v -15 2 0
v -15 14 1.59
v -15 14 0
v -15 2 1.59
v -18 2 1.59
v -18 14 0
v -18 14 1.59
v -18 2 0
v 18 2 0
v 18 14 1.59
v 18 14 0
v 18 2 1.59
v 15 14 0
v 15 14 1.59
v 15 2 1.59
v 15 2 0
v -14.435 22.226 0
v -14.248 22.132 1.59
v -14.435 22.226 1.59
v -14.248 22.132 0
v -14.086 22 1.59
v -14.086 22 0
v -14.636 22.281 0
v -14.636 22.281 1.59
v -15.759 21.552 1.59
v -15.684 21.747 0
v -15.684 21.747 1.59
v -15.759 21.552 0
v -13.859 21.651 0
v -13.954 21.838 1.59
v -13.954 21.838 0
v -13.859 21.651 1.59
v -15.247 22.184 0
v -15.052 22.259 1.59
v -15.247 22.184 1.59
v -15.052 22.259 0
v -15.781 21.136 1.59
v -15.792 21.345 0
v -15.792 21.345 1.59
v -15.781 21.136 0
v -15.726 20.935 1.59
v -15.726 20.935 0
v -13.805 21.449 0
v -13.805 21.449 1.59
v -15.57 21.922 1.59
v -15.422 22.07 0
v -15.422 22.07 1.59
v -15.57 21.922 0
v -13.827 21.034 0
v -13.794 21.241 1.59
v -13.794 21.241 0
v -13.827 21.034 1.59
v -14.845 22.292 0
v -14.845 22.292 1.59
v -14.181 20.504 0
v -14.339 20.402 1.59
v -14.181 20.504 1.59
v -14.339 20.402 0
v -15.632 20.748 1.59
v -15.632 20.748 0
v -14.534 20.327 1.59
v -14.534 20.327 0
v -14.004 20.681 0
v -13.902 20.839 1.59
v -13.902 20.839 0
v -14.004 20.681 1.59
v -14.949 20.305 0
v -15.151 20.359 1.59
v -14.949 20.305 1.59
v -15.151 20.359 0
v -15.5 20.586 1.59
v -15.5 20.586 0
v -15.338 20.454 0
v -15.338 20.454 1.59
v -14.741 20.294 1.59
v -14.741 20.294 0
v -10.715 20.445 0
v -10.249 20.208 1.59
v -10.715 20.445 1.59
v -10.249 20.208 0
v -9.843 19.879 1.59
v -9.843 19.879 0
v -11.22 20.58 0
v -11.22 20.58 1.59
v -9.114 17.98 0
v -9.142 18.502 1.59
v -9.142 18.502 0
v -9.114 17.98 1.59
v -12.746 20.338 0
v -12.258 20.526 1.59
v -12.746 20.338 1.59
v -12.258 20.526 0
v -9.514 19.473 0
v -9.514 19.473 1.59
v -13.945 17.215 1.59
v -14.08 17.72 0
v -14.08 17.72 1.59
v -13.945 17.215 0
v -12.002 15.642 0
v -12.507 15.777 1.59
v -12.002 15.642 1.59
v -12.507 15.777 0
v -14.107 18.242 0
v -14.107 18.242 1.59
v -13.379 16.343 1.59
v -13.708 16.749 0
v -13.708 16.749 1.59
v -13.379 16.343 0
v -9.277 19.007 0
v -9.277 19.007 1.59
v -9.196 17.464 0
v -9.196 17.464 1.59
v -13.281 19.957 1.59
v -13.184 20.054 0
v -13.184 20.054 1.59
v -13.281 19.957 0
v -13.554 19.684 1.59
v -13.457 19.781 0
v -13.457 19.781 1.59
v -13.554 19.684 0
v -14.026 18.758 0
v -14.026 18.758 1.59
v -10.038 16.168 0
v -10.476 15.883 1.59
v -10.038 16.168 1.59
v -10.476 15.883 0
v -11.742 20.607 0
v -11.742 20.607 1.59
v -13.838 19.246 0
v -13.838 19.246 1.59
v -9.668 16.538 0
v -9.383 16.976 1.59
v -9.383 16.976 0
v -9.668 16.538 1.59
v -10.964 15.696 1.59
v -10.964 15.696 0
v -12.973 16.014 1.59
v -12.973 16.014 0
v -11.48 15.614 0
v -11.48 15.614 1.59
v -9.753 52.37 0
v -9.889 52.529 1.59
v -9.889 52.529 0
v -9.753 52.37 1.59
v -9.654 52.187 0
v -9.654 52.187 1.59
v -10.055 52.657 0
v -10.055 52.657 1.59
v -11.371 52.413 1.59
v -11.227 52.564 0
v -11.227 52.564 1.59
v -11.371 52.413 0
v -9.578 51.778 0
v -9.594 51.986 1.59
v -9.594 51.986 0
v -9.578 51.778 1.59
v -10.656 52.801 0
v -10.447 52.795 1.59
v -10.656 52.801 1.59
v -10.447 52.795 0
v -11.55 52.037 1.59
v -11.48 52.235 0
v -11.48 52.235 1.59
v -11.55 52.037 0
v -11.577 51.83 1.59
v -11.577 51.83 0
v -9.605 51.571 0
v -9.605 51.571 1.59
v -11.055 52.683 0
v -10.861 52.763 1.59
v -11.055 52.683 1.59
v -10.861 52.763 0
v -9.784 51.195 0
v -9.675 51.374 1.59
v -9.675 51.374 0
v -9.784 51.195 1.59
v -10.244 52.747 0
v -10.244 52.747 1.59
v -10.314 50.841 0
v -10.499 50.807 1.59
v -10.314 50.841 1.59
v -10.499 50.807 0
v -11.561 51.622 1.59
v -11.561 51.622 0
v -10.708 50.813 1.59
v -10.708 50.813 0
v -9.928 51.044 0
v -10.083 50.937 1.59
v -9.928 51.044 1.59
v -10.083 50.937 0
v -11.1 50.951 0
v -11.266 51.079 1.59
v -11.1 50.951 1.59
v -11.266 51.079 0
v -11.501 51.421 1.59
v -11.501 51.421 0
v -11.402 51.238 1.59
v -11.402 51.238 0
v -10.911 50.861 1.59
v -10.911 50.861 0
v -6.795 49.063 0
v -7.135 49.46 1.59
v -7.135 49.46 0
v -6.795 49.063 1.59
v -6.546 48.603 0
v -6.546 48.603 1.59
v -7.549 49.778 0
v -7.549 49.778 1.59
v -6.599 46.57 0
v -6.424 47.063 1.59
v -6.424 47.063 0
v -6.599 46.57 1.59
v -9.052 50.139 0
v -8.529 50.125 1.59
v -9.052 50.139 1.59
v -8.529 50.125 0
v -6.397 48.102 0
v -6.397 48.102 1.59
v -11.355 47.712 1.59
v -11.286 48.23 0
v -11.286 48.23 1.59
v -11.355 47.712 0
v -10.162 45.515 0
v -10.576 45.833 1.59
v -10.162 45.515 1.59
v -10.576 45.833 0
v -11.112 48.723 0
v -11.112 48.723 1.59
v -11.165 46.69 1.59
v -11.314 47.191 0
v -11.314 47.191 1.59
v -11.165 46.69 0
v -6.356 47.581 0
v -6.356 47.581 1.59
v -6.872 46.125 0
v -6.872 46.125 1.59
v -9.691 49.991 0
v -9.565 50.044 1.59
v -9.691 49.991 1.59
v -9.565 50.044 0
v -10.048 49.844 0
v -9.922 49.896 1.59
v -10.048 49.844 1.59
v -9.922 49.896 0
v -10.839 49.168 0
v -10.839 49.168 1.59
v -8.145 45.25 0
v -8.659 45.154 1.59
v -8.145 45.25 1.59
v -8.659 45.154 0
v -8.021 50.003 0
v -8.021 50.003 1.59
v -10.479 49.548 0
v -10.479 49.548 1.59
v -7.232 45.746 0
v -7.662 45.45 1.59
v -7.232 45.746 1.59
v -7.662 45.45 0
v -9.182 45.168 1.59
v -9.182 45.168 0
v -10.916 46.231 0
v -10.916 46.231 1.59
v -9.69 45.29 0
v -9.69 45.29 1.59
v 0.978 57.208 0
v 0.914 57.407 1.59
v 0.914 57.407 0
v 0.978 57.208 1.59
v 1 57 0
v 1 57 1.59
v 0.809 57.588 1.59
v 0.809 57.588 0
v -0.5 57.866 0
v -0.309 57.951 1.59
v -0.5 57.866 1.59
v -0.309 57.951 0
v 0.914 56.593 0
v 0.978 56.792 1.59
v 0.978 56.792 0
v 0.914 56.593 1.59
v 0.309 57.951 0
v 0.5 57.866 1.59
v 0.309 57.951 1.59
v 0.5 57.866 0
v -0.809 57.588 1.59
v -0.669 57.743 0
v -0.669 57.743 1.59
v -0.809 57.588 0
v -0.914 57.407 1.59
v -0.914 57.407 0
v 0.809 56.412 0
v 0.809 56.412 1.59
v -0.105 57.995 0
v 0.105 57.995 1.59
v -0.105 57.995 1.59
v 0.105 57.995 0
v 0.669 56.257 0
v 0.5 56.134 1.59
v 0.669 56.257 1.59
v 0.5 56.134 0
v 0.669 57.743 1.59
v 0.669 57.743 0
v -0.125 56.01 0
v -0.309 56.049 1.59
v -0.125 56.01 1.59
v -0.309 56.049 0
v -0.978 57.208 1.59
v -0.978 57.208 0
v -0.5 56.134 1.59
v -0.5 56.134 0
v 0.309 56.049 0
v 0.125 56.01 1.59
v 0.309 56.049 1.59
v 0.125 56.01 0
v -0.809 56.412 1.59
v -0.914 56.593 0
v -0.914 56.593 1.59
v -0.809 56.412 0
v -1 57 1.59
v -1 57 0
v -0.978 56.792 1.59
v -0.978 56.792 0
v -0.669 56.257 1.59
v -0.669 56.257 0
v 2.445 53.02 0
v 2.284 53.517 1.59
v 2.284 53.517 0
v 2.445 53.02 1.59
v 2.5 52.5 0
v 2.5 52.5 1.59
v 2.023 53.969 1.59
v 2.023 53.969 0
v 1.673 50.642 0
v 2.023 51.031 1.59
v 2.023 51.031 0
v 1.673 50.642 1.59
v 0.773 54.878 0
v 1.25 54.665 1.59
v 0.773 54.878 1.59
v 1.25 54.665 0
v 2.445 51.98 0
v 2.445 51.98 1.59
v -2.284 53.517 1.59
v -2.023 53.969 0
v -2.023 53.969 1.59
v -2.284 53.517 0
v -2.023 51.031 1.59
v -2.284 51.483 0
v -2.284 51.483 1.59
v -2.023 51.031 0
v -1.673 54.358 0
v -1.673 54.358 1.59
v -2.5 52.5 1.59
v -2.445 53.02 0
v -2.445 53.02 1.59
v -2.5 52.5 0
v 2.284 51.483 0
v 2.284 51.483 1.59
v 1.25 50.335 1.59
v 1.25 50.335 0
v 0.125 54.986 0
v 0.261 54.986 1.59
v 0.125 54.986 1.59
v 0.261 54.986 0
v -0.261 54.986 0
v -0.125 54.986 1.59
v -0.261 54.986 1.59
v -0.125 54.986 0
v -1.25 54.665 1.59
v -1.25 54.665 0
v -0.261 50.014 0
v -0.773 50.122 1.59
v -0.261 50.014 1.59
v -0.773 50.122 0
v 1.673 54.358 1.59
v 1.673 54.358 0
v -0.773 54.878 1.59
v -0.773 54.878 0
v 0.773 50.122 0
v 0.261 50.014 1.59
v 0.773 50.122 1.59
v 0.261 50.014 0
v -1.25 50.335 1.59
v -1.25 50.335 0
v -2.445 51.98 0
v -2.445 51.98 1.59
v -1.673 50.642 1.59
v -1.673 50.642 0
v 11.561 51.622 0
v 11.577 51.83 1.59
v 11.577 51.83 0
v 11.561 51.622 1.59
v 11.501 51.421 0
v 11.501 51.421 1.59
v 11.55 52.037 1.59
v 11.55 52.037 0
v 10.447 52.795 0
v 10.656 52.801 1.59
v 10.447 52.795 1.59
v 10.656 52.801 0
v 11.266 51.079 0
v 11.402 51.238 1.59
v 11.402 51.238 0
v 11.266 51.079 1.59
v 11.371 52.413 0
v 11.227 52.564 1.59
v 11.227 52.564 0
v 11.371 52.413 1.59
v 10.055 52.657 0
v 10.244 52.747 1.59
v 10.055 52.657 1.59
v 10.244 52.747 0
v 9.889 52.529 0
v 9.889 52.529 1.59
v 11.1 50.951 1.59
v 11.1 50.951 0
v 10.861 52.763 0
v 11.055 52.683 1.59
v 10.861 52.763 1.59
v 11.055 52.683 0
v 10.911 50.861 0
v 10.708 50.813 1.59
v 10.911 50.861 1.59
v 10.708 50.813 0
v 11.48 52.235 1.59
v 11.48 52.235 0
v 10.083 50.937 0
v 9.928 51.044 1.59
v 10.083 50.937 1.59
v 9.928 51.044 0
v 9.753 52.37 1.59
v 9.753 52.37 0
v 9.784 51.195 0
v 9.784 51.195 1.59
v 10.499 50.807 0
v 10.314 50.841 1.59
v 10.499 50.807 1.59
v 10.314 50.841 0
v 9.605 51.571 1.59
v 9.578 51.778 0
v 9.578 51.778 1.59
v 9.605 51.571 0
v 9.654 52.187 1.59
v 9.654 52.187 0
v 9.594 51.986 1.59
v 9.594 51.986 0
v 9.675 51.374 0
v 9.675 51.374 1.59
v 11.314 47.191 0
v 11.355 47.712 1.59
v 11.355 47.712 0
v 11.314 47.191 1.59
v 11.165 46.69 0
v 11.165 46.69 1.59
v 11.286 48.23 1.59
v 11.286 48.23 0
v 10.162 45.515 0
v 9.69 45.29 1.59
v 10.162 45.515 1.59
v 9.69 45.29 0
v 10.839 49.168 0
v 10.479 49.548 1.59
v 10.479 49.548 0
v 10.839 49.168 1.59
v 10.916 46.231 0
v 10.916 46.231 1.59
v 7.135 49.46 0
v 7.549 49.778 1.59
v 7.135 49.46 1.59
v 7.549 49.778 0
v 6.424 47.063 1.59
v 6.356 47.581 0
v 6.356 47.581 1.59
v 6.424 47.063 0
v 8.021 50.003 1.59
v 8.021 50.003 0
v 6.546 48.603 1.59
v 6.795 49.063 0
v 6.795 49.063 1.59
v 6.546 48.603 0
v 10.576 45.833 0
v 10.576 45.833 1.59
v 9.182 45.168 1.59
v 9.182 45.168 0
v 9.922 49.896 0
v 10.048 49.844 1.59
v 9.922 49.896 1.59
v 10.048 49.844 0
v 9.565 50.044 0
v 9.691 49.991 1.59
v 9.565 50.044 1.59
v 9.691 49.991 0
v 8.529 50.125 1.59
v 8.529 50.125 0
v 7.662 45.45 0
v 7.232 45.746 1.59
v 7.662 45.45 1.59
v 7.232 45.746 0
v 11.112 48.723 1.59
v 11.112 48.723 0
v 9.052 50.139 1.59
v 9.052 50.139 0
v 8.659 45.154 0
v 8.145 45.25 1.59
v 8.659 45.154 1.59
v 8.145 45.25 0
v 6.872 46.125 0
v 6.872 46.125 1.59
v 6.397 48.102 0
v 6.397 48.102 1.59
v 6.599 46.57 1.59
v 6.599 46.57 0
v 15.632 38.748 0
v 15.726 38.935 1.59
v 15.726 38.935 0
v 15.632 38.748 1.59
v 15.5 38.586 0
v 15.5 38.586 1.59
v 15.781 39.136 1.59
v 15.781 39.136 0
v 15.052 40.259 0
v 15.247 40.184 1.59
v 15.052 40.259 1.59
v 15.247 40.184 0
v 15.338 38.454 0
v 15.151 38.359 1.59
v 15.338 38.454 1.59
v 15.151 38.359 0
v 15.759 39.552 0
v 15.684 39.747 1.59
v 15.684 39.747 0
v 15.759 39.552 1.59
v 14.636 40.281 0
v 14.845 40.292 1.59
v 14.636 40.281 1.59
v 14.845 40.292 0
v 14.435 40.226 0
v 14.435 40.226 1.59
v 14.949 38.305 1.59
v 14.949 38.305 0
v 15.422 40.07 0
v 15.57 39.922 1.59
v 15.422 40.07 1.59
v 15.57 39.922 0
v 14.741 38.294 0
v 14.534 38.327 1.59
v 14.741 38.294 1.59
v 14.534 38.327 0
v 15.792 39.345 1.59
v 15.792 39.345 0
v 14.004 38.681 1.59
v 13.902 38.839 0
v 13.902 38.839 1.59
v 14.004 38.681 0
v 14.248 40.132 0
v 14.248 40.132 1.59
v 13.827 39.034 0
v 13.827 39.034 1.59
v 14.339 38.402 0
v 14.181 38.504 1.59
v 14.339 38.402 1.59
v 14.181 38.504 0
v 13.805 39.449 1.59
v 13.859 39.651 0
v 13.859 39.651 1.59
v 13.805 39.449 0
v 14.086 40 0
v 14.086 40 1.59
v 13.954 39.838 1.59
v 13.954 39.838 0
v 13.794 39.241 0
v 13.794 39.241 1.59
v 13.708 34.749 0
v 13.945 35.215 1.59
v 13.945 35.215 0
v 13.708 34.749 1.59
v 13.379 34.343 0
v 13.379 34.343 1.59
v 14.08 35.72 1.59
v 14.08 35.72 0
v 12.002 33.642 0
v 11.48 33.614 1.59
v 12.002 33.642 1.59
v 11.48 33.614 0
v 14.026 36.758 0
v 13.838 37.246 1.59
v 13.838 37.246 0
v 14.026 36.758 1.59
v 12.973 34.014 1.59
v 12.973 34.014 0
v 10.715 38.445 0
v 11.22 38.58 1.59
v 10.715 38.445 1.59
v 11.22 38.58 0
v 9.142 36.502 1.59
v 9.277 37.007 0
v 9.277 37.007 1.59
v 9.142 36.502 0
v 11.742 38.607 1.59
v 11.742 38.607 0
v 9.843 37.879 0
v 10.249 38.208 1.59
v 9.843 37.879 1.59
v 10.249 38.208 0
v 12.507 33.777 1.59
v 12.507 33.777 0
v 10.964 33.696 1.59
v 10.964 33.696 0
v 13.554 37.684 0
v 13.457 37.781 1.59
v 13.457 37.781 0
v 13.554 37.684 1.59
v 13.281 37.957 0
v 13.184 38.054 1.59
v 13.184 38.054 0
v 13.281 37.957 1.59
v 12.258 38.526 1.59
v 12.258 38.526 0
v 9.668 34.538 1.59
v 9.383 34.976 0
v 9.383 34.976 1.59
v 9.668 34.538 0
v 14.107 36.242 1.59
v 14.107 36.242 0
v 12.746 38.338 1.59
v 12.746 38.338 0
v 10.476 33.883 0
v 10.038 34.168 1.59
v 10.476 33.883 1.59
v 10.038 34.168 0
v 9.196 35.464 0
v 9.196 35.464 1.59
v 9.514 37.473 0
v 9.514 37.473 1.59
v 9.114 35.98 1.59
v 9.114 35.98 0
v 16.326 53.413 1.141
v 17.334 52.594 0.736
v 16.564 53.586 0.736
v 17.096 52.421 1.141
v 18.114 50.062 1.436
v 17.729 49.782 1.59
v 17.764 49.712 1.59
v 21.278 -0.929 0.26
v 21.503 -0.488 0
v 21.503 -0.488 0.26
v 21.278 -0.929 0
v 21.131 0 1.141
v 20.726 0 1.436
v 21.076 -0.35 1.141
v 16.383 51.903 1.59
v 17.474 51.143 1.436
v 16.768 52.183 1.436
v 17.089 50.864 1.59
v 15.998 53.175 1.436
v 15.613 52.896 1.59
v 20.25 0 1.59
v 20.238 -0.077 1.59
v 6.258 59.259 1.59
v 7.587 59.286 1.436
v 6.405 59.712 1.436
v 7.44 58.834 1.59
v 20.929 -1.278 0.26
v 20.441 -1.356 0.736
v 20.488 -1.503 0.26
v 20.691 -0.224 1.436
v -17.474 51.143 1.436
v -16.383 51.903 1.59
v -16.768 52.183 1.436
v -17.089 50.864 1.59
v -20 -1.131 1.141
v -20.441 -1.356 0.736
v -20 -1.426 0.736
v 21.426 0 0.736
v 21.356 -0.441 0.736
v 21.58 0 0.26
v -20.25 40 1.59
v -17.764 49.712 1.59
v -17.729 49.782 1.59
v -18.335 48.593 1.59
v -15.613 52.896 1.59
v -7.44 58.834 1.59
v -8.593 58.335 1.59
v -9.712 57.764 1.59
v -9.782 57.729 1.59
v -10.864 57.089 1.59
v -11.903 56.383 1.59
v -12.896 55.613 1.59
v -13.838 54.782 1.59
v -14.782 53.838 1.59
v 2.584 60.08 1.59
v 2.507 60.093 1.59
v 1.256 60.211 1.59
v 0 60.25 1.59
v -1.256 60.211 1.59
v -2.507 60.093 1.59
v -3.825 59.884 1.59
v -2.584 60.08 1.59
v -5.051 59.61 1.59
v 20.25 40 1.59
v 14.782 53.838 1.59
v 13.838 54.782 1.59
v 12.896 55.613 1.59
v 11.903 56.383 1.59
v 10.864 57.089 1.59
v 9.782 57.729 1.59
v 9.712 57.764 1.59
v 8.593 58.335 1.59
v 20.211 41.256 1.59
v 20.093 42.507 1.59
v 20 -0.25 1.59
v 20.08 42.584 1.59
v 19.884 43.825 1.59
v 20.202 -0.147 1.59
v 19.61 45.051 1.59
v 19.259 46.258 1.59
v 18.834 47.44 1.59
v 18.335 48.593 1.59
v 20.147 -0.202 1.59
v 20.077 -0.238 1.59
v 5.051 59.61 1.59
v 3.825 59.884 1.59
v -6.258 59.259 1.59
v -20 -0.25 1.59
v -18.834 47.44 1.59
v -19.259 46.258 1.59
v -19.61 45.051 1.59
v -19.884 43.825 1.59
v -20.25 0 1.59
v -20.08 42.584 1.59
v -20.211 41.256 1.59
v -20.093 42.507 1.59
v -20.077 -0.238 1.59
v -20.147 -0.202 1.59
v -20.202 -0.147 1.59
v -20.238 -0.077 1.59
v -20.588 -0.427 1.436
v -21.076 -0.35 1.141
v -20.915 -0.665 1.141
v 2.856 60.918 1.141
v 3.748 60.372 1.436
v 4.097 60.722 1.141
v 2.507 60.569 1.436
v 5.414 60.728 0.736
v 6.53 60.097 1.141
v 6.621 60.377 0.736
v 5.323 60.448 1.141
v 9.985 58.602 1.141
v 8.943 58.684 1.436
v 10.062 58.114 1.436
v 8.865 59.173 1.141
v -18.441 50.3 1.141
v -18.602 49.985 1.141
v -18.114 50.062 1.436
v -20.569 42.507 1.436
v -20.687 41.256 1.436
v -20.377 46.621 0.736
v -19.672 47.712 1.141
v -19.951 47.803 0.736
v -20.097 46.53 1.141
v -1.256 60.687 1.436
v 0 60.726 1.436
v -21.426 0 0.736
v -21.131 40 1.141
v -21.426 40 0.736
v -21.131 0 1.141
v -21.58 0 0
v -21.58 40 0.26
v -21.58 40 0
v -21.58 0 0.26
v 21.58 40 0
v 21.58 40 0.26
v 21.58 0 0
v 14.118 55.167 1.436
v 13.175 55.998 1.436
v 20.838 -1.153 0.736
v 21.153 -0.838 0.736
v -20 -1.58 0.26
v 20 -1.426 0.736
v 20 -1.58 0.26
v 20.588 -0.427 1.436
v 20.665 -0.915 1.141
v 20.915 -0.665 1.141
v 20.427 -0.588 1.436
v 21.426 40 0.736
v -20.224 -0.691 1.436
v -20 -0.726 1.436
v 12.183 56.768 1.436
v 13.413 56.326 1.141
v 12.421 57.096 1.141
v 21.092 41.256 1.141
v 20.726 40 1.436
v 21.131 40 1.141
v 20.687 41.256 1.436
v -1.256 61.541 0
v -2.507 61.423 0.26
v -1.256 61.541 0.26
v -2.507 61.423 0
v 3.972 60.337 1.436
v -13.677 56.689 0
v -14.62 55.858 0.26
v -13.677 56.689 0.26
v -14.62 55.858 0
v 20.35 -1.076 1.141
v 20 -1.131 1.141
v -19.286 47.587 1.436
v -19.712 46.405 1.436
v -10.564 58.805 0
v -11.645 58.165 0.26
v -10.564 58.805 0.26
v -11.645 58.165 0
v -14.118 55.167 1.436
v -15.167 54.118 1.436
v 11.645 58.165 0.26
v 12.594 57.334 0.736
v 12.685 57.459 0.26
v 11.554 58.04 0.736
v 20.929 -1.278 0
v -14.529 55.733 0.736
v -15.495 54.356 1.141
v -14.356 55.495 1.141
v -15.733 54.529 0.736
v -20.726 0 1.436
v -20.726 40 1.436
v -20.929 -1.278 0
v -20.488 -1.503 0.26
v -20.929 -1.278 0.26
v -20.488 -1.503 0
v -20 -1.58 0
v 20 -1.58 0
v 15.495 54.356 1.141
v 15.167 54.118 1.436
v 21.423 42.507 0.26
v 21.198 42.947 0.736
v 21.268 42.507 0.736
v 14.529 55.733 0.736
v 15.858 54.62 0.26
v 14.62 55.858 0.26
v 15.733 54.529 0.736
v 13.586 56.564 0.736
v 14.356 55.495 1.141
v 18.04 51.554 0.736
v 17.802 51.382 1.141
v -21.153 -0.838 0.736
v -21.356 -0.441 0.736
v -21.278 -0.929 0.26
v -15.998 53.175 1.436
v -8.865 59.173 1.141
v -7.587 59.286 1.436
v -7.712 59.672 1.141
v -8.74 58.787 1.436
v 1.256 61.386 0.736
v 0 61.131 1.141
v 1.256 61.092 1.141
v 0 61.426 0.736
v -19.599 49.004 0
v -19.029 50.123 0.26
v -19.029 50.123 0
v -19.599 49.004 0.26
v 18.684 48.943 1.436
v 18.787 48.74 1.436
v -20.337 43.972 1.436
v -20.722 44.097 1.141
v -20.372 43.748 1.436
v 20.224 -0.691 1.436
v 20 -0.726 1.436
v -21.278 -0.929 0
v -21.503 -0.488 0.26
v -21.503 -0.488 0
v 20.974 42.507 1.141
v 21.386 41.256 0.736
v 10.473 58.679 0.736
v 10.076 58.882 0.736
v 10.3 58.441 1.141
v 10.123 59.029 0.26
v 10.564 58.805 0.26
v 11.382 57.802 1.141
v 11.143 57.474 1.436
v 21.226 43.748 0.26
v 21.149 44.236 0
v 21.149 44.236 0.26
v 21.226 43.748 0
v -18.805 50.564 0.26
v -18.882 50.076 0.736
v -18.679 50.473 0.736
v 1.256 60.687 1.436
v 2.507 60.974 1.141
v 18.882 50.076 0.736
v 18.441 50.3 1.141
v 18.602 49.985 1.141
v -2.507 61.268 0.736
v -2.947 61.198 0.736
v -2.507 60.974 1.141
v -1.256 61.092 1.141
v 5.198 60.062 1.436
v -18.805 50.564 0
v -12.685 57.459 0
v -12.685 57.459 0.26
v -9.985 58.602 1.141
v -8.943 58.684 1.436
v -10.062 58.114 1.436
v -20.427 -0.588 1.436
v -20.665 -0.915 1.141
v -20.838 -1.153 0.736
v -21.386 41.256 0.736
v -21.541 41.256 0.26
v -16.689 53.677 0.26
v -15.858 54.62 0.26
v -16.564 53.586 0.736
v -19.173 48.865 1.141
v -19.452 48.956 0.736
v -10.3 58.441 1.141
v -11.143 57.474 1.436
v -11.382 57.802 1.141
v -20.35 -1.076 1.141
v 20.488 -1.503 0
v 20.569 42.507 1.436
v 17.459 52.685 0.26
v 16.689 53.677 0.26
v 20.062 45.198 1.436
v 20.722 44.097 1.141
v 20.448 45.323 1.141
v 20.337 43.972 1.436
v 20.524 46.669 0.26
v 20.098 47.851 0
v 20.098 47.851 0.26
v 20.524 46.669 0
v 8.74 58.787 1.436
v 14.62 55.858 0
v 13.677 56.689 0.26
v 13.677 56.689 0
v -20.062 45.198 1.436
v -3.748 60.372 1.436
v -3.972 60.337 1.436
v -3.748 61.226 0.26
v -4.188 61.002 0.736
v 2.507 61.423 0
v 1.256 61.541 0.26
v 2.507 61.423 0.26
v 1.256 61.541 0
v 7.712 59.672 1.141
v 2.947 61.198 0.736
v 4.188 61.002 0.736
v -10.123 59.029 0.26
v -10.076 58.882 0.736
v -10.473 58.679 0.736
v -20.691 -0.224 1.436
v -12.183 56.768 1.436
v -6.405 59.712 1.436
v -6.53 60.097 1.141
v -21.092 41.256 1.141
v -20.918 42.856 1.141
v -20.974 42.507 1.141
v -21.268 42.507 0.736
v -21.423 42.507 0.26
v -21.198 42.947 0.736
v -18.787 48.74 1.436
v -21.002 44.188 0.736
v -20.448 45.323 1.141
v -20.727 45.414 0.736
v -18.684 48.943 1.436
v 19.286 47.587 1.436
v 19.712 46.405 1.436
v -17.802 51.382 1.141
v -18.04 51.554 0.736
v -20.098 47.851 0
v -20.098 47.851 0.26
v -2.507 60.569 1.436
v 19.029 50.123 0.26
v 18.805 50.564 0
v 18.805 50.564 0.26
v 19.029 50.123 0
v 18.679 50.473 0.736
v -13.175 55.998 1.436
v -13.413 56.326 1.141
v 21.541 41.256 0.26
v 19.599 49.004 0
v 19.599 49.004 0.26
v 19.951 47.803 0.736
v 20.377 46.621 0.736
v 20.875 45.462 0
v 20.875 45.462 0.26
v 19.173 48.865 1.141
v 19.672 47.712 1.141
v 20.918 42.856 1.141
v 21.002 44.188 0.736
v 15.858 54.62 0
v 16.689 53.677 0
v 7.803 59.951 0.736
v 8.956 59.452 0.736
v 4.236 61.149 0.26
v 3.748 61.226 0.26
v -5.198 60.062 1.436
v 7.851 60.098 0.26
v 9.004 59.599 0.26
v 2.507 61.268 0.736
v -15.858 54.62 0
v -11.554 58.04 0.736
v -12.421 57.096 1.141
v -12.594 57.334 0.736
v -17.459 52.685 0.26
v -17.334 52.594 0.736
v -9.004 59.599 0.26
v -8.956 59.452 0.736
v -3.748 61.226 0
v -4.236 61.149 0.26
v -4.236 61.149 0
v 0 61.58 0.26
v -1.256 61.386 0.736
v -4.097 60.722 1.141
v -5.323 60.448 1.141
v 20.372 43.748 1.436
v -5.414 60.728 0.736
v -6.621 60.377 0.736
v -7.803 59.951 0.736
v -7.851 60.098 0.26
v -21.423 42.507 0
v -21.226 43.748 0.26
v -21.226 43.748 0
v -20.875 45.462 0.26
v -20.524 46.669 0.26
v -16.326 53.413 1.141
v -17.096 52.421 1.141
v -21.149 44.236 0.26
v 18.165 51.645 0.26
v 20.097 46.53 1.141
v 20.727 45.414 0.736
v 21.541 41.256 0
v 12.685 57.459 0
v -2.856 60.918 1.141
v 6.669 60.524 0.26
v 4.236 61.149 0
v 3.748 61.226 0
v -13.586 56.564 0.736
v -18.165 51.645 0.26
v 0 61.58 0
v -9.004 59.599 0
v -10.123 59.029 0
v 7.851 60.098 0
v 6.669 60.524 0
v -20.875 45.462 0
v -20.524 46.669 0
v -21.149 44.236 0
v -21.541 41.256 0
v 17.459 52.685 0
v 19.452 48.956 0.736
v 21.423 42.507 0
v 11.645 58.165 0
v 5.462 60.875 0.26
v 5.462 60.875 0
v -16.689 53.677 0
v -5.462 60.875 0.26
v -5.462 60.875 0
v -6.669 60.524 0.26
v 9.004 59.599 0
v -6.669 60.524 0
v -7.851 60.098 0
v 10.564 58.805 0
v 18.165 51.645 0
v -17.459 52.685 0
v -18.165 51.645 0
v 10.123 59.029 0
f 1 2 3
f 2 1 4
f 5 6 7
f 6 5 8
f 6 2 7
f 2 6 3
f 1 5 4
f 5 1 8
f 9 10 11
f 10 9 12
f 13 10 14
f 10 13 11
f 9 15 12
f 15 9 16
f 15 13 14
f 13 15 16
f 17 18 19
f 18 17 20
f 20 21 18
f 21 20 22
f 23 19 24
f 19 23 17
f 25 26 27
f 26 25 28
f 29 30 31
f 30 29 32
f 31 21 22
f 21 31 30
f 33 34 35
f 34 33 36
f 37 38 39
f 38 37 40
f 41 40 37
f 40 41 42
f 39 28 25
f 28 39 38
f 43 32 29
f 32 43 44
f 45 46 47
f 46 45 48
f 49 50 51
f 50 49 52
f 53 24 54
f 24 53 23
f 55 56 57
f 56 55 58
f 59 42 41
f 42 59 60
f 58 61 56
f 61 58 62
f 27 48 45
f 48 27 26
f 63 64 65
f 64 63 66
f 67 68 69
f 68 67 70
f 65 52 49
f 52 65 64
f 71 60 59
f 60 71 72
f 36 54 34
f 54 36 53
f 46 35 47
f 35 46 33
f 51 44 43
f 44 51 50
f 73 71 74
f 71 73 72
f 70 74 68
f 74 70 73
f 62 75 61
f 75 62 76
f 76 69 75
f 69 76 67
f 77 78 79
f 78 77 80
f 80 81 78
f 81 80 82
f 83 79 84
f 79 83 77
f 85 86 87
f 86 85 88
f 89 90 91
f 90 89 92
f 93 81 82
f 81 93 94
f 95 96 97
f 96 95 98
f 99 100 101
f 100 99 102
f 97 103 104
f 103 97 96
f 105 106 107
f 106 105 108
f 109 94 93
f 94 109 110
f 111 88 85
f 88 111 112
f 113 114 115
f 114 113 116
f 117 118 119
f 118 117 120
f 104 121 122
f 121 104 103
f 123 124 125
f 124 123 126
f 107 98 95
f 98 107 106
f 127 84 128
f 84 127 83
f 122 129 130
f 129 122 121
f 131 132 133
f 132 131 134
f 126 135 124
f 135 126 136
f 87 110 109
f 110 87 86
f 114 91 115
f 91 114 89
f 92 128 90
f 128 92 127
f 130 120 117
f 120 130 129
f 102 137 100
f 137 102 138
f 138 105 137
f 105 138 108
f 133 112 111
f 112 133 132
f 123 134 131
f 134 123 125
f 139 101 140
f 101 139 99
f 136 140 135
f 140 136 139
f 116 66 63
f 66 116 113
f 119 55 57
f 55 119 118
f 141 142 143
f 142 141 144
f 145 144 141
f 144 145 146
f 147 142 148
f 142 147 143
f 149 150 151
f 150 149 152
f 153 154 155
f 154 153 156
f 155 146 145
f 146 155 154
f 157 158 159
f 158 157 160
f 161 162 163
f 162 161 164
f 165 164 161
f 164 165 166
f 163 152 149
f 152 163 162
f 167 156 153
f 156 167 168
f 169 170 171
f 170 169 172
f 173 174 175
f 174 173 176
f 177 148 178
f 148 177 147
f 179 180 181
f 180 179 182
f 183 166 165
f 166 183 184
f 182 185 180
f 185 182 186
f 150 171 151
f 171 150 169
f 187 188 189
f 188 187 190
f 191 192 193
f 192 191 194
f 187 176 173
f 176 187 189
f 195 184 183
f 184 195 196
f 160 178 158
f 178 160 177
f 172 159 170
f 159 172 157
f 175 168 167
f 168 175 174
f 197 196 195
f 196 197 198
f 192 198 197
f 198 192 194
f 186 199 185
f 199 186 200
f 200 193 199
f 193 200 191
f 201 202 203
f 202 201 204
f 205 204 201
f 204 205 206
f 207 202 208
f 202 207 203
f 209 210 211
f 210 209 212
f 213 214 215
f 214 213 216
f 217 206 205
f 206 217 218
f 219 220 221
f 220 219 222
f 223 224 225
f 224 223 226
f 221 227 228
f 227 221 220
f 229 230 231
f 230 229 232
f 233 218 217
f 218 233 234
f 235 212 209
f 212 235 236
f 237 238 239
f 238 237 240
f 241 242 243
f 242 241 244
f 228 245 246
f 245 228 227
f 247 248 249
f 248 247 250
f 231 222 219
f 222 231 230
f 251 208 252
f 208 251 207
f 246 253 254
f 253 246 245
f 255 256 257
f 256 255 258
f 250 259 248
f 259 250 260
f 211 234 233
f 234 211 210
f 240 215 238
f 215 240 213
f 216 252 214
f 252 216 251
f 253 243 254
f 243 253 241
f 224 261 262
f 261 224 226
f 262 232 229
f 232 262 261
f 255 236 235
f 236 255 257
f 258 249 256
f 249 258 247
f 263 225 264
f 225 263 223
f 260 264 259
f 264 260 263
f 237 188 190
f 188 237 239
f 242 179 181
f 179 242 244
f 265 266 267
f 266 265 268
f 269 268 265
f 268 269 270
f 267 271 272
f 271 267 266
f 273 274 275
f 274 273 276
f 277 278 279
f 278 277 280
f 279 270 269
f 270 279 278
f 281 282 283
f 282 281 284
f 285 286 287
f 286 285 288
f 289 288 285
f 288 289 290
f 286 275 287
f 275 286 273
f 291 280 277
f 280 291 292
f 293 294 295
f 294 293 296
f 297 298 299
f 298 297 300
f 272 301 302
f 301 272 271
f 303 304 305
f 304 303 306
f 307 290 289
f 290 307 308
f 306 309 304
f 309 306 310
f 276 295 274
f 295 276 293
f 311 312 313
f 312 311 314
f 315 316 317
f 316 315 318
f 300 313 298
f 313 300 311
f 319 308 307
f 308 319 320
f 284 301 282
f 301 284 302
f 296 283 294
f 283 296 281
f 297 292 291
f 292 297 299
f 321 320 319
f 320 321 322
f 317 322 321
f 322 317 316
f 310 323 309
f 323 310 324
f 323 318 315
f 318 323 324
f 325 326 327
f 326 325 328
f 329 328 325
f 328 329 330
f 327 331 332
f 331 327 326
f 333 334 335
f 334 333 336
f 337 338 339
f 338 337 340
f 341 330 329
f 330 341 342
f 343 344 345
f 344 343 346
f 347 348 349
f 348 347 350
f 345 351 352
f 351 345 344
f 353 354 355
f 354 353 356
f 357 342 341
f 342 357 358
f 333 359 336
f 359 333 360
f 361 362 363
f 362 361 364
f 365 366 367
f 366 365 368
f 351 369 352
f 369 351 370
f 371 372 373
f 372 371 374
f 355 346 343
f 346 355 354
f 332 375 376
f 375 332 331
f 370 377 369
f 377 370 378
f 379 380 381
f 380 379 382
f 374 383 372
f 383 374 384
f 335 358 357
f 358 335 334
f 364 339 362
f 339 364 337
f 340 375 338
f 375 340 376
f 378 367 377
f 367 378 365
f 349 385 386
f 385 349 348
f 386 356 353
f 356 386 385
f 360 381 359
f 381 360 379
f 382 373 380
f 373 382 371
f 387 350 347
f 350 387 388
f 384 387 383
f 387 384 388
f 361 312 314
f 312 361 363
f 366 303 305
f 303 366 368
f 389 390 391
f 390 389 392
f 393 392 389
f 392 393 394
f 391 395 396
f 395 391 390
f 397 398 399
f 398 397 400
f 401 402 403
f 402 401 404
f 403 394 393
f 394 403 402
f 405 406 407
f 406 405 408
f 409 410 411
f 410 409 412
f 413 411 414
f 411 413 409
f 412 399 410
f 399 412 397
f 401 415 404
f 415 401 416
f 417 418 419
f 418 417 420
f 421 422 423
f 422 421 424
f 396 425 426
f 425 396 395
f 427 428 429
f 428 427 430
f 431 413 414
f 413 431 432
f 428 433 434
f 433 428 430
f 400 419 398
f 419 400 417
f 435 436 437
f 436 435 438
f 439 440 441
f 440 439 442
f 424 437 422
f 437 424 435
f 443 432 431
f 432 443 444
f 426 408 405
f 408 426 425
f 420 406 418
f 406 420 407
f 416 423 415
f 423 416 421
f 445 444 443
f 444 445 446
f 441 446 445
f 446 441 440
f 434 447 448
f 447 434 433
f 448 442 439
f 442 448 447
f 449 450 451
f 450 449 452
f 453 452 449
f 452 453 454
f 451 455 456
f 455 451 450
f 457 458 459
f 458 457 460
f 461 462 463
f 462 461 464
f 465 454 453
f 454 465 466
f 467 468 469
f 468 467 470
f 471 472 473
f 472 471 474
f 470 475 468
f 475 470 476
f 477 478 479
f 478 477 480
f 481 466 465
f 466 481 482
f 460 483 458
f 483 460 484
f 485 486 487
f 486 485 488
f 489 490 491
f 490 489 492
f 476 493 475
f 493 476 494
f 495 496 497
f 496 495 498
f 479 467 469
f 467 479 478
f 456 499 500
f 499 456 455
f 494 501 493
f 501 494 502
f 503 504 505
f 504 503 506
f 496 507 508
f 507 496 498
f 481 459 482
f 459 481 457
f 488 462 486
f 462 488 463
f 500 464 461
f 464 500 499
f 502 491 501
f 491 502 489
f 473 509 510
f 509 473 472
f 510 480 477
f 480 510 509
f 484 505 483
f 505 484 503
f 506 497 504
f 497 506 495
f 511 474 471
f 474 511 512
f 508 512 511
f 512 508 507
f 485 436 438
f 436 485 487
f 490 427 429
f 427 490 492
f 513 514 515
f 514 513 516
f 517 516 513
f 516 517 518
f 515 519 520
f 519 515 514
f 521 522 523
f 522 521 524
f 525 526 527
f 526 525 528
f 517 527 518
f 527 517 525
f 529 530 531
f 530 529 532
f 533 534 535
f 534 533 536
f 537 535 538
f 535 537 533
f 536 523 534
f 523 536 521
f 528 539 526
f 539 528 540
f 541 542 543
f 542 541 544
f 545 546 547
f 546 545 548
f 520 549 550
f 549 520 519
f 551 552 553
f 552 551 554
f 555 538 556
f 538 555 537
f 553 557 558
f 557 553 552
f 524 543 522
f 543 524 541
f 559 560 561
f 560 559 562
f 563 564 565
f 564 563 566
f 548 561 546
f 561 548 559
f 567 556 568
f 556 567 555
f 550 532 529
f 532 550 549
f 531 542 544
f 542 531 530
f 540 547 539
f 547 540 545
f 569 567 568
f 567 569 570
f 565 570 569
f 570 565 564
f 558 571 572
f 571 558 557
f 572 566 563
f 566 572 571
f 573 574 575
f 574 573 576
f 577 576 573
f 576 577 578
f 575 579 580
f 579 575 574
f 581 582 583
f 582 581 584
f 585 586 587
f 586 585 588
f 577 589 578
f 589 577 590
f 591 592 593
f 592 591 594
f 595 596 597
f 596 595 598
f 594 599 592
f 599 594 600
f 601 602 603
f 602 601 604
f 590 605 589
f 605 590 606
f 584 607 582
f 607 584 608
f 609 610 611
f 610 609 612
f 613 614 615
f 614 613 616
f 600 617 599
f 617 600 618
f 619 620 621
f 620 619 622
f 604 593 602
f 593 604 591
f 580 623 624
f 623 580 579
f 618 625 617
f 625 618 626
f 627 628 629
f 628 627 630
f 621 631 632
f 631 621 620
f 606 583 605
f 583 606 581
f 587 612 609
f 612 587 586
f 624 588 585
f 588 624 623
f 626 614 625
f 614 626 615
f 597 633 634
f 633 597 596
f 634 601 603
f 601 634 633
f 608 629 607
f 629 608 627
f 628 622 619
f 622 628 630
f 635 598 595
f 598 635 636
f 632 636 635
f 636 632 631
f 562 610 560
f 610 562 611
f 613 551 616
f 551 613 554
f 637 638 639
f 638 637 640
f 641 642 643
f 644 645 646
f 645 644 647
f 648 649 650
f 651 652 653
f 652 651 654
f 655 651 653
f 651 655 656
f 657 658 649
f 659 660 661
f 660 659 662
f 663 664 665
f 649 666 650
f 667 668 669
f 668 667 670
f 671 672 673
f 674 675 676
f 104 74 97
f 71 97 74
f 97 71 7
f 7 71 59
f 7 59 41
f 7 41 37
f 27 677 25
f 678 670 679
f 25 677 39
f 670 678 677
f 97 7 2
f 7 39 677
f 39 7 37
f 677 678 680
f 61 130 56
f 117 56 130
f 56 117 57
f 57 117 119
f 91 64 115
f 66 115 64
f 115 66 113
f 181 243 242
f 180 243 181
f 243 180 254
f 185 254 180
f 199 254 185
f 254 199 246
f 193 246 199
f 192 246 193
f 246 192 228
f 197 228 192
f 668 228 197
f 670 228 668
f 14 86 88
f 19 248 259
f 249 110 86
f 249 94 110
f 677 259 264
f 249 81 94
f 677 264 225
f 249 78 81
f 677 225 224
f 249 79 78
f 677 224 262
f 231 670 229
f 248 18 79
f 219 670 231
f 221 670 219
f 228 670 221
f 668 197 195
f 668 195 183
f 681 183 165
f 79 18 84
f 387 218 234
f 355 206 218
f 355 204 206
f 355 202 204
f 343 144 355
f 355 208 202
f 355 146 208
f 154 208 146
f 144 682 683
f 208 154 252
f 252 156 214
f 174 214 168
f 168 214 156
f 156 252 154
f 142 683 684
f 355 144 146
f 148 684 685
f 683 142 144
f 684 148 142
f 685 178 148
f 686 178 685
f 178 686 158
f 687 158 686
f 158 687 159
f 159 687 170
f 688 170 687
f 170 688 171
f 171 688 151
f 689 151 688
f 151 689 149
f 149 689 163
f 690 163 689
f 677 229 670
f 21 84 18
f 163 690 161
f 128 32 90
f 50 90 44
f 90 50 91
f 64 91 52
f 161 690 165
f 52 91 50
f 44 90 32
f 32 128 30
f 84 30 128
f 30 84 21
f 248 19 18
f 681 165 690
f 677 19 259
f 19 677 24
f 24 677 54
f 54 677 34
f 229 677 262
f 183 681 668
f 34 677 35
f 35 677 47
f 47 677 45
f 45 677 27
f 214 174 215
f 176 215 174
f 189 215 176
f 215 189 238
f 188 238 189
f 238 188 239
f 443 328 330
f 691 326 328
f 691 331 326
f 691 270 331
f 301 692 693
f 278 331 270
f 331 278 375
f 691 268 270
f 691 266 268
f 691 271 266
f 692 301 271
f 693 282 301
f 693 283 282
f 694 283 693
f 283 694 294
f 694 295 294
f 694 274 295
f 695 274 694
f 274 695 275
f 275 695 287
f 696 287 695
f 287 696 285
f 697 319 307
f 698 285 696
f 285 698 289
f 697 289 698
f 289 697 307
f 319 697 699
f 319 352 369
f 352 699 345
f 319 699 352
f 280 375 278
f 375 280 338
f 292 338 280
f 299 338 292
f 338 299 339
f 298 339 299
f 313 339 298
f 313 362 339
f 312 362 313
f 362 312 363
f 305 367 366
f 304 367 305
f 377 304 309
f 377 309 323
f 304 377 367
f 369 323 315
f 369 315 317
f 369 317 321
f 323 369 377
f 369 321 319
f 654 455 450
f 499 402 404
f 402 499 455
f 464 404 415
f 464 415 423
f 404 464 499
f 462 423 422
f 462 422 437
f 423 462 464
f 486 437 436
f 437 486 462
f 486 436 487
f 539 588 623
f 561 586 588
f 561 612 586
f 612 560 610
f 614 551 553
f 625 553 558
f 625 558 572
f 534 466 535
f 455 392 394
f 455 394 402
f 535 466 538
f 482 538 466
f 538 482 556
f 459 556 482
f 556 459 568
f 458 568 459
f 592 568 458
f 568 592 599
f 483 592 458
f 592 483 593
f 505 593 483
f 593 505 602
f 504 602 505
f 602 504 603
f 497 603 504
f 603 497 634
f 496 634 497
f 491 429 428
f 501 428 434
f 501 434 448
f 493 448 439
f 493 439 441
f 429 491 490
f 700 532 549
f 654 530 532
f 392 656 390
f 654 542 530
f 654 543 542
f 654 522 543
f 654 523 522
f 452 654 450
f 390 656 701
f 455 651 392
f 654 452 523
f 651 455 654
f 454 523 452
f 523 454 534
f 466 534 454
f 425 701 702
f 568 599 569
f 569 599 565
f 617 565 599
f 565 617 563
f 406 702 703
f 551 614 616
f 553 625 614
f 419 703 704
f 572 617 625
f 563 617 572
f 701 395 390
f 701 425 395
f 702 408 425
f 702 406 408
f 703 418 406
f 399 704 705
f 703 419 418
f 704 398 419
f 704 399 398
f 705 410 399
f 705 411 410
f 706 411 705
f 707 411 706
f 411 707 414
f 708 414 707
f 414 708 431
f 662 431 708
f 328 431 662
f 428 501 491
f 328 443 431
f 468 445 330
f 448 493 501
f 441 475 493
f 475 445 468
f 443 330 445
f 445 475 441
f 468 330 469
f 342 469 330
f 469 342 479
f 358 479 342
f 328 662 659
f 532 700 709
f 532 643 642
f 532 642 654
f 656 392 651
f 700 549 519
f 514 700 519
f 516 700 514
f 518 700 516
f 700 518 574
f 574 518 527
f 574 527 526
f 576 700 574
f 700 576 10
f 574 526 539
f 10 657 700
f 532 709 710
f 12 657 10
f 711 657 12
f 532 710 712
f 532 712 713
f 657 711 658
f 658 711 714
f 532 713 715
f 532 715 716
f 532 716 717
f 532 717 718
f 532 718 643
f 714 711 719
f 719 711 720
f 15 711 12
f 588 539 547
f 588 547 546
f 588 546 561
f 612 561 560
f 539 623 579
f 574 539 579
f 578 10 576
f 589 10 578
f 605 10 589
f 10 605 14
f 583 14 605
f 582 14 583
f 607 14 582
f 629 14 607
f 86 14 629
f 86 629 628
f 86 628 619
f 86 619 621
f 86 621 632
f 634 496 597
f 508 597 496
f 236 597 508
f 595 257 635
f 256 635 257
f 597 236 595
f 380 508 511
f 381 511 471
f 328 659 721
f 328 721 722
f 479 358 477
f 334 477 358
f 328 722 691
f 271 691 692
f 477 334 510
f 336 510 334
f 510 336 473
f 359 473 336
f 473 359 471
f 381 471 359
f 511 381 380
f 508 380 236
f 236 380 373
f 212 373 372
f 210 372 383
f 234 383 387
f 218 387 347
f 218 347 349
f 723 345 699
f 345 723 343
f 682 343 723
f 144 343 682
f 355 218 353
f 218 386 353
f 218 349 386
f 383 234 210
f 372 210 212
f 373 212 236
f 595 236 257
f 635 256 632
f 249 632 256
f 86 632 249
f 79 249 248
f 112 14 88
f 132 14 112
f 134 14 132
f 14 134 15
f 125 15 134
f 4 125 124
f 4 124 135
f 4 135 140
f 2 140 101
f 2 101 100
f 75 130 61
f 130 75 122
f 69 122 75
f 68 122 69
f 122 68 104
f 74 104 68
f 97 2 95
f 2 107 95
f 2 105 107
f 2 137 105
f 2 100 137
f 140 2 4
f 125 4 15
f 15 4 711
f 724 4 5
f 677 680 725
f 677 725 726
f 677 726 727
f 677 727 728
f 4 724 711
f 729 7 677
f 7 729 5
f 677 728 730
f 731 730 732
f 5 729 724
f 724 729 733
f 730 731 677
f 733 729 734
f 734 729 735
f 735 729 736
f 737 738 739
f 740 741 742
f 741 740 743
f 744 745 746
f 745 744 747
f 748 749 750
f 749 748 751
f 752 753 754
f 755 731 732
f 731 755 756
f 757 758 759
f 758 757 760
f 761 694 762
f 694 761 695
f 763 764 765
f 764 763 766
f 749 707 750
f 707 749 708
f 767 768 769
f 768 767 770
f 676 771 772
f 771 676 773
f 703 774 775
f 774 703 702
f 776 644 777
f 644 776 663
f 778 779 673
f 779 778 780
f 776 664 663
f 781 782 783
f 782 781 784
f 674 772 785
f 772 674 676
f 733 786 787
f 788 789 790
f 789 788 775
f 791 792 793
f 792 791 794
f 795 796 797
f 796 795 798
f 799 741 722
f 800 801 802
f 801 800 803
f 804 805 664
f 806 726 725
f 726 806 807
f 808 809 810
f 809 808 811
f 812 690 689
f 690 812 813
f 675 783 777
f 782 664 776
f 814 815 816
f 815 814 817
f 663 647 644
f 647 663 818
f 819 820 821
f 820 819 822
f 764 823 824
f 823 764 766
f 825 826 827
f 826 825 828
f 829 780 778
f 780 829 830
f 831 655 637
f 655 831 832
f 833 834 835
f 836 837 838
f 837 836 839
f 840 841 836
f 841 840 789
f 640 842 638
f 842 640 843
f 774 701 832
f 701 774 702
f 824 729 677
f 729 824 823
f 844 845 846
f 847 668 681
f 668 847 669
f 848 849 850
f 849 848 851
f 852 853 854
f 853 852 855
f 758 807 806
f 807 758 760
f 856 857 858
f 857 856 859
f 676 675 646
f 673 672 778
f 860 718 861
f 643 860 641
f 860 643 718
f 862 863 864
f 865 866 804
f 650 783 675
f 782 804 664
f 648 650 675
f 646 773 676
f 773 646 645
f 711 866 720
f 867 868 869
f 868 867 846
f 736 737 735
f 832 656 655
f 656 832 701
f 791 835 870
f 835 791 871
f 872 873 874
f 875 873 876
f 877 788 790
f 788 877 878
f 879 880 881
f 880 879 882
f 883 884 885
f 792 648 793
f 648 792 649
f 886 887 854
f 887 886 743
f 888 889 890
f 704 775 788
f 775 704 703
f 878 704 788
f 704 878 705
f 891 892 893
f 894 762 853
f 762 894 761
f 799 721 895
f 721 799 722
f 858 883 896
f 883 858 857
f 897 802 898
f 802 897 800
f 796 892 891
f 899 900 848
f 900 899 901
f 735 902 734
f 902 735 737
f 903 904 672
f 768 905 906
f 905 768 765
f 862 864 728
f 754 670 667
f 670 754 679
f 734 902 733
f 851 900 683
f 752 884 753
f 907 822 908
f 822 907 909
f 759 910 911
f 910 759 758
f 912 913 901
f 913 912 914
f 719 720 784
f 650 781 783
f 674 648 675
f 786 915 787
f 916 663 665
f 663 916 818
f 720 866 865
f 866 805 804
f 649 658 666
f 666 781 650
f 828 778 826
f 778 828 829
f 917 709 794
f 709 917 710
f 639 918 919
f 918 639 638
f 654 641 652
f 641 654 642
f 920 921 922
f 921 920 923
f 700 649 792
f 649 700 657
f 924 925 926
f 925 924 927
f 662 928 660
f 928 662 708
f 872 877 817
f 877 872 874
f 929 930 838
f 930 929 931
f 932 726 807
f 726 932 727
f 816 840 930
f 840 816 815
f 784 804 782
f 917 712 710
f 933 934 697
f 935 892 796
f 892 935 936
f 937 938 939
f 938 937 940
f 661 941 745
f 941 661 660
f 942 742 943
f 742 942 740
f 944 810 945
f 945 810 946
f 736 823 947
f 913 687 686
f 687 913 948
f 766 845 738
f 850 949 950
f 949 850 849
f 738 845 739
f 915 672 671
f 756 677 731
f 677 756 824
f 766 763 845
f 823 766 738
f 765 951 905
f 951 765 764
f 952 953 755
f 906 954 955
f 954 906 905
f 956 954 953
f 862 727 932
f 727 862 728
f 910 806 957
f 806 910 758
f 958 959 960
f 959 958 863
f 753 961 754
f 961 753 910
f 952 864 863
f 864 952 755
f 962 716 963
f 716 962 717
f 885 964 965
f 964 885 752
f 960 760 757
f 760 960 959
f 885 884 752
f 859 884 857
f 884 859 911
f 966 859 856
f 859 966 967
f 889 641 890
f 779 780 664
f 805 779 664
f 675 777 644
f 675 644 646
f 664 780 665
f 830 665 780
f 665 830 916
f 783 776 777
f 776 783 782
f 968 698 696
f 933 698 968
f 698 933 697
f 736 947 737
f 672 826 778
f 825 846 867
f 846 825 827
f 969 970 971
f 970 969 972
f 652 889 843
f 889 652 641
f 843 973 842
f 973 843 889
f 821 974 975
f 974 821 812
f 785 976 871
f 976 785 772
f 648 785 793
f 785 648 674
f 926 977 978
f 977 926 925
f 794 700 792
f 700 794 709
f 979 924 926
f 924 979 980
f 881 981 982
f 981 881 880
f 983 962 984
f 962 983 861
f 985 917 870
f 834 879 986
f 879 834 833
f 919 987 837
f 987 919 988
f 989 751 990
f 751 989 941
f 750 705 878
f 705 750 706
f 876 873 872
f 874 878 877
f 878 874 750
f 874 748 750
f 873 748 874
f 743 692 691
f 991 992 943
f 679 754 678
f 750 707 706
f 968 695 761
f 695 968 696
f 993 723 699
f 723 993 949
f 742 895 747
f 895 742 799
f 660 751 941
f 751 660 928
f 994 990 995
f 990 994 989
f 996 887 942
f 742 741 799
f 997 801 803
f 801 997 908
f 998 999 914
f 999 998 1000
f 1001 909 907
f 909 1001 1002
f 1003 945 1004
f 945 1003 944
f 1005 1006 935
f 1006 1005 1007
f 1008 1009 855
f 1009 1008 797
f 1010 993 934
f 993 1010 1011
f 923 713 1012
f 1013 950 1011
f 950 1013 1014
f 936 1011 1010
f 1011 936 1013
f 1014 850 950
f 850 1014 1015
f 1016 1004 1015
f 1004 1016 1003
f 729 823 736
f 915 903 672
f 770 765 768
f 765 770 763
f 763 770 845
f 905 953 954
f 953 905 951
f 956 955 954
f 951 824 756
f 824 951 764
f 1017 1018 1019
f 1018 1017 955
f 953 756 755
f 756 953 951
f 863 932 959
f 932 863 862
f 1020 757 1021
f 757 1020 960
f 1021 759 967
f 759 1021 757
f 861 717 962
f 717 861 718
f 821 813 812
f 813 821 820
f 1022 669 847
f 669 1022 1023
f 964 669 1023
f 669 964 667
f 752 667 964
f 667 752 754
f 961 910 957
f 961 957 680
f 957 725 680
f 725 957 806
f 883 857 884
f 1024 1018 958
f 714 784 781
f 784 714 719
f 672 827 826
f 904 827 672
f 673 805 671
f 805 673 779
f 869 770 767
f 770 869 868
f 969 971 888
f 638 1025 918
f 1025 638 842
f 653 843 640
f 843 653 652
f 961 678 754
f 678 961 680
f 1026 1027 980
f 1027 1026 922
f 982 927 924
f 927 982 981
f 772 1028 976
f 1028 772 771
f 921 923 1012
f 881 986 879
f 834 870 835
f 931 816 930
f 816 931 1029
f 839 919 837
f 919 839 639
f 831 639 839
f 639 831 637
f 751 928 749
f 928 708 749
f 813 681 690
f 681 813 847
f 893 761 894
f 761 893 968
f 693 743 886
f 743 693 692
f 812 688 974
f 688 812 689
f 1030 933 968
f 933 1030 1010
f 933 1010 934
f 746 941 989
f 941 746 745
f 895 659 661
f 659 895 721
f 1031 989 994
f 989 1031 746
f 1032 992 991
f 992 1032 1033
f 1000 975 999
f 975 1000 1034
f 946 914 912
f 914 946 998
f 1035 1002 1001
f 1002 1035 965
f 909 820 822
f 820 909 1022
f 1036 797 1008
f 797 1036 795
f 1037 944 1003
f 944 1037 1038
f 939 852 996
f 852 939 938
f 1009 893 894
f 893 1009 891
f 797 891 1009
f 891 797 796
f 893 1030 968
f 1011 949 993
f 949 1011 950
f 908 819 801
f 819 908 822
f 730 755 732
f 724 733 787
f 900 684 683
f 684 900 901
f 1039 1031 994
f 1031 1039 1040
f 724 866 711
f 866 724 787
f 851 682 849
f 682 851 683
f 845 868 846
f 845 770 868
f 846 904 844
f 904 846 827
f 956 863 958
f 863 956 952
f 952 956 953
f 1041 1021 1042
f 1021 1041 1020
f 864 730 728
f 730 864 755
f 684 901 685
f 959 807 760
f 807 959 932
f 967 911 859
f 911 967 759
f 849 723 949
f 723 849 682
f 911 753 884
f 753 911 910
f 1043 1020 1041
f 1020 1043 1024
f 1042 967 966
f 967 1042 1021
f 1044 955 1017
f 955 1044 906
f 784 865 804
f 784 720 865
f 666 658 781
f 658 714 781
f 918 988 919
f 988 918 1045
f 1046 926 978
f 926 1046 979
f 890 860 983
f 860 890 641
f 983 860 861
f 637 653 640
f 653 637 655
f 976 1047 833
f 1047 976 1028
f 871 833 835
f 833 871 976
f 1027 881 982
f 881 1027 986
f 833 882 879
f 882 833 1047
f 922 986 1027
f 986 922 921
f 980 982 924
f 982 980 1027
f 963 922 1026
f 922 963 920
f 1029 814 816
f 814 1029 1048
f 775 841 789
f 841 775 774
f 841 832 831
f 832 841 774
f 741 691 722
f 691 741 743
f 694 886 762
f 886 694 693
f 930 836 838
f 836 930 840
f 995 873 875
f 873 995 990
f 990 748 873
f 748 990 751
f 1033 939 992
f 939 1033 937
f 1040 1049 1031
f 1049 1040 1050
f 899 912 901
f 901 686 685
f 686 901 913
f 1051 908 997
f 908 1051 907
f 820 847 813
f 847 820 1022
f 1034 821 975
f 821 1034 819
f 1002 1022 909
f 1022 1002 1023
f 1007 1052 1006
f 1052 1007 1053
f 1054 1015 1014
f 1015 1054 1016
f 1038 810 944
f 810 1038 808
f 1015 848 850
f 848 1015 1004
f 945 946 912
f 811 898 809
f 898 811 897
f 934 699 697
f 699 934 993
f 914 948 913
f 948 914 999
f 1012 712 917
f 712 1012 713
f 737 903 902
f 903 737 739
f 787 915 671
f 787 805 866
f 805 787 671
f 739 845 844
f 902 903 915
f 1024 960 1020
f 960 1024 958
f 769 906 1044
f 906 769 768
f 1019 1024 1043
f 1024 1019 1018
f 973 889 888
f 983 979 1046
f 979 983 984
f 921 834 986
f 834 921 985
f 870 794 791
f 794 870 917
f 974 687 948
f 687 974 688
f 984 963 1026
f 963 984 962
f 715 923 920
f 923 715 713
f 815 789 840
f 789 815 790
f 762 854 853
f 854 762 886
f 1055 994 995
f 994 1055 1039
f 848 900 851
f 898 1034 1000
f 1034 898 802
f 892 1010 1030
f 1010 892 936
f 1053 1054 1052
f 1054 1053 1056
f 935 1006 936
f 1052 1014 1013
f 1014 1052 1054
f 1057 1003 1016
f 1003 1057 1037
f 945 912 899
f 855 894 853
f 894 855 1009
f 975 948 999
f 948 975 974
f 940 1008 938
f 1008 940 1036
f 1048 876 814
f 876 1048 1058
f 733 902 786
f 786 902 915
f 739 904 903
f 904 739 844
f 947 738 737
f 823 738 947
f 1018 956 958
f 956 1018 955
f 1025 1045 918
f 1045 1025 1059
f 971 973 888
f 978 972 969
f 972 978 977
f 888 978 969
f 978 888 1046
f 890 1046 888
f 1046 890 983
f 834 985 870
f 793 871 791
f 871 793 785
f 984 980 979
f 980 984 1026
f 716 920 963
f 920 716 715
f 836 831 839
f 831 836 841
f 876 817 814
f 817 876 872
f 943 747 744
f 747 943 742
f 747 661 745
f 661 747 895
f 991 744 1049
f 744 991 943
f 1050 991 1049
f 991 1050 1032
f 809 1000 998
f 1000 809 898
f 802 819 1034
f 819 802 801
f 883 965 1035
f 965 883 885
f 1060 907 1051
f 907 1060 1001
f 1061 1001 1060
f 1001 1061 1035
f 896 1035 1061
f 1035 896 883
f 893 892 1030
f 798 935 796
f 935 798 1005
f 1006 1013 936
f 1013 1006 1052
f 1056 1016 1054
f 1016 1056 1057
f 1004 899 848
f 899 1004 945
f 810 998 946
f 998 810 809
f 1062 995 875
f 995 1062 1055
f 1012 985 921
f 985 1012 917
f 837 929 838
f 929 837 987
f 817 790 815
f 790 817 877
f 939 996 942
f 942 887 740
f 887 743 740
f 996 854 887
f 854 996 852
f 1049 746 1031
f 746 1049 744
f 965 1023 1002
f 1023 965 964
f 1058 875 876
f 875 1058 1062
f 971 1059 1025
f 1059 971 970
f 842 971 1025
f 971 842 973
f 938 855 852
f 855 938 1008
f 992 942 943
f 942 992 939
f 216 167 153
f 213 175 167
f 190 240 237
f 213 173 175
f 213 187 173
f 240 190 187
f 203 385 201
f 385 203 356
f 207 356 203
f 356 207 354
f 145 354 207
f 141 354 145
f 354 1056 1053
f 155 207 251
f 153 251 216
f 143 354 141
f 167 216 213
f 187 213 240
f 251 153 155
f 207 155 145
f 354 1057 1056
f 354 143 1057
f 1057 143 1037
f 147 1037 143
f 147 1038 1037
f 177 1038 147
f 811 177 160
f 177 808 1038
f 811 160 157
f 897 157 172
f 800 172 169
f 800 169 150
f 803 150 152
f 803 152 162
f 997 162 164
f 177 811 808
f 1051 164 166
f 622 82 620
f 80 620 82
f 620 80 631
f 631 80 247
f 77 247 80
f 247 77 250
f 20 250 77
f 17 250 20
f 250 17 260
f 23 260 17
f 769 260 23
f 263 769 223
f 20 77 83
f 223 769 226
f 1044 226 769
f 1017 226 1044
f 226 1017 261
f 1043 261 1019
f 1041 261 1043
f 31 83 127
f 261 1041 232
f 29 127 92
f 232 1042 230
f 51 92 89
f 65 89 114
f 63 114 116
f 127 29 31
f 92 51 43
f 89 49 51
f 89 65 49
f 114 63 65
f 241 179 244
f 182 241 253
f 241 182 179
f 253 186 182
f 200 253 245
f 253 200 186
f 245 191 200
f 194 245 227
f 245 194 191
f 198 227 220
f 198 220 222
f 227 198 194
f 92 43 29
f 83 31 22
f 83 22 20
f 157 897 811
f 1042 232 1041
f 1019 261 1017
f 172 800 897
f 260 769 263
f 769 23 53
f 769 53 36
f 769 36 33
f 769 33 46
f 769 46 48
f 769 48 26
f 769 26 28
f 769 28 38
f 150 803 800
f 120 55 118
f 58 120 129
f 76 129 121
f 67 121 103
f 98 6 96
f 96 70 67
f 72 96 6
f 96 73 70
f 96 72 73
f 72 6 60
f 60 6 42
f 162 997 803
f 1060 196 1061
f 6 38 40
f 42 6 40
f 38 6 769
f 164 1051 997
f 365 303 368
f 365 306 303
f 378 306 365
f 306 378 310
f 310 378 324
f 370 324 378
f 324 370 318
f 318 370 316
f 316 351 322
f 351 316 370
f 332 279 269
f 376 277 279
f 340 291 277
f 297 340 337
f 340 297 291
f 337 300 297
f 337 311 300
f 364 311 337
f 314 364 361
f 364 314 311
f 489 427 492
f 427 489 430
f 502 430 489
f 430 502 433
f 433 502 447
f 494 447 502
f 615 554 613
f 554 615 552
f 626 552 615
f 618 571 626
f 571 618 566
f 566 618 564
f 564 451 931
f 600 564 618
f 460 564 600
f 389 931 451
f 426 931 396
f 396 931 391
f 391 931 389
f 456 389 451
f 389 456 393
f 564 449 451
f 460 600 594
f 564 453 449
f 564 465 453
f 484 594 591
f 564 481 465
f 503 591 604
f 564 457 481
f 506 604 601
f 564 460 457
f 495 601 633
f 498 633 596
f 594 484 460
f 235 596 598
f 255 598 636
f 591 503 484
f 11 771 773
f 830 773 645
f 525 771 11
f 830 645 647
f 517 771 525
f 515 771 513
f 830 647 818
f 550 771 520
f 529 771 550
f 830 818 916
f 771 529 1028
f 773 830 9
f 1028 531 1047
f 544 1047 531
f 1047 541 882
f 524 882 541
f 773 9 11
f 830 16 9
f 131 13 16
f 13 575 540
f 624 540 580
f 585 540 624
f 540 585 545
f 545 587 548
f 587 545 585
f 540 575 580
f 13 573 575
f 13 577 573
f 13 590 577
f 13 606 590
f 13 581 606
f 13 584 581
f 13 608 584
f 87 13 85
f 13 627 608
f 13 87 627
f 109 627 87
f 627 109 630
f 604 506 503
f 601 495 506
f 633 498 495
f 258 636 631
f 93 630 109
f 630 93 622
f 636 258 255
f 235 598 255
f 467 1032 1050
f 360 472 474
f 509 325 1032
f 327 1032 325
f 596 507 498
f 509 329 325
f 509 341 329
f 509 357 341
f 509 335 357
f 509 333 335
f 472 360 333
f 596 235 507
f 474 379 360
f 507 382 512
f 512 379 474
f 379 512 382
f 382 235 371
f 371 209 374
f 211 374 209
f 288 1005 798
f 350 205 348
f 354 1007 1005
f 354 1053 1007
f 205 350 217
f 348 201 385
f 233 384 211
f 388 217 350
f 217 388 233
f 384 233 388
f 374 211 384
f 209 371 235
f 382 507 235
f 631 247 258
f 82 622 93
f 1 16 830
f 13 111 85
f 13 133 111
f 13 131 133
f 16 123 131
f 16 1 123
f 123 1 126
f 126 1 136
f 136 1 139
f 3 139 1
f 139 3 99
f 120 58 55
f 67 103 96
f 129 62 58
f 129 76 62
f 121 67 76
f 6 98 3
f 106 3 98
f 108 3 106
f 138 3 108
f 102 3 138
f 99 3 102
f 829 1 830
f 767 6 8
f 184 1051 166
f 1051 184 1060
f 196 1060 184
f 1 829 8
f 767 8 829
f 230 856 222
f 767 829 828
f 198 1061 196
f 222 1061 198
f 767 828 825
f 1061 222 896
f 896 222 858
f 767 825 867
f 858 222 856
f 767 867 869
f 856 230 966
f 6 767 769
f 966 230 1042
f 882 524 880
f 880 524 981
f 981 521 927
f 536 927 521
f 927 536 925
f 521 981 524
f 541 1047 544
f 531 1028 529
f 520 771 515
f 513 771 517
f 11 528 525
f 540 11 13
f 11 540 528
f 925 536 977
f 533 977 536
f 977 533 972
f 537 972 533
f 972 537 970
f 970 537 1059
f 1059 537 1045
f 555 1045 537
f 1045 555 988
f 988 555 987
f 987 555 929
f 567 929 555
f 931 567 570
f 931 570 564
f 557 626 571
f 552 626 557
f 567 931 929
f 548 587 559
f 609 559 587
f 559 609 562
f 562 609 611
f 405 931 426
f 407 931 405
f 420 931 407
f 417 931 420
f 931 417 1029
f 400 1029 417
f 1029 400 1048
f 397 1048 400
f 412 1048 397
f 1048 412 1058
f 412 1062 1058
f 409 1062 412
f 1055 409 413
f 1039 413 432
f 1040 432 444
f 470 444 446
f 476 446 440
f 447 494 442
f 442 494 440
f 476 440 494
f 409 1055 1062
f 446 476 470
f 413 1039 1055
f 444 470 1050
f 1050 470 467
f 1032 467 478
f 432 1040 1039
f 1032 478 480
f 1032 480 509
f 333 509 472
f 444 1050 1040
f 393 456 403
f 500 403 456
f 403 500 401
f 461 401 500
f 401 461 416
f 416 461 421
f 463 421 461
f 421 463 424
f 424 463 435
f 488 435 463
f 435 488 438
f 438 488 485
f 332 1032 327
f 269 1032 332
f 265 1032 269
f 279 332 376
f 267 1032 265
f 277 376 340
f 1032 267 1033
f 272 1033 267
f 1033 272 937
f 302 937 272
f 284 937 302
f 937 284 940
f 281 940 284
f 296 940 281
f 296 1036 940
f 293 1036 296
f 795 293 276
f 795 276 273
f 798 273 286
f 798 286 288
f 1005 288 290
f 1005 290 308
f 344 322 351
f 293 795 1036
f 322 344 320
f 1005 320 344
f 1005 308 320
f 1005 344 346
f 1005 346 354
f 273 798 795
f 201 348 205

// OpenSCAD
/* The part that goes on the back of your hand for the fingers to attach to */

length = 60;
width = 40;
thickness = 1.6;

strap_width = 12;
strap_thickness = 3;

hole_clearance = 2; // The distance between any hole and he edge of the model
knot_hole_diameter = 5;
elastic_hole_diameter = 2;
gap_width = 0.25;
slot_length = 1;

number_of_fingers = 5;
start_angle = -90;

tiny_distance = 0.01;
large_distance = 200;

$fn = 100;

difference(){
    minkowski() {
        plate();
        sphere(r=thickness, $fn=20);
    }
    strap_holes();
    finger_holes();
    translate([-large_distance/2, -large_distance/2, -large_distance]) {
        cube([large_distance, large_distance, large_distance]);
    }
}

module plate(){
    translate([-width/2, 0, 0]) {
        cube([width, length - width/2, tiny_distance]);
        
    }
    translate([0, length - width/2, 0]) {
        cylinder(d=width, h=tiny_distance);
    }
}

module strap_holes(){
    translate([0, hole_clearance, -large_distance/2]){
        strap_hole();
        mirror([1, 0, 0]) {
            strap_hole();
        }
        
    }
}

module strap_hole(){
            translate([(hole_clearance - width/2), 0, 0]){
                cube([strap_thickness, strap_width, large_distance]);
            }

}

module finger_holes() {
    angle_increment = 2*start_angle/(number_of_fingers - 1);
    translate([0, length - width/2, 0]){
        for (i=[0:number_of_fingers-1]) {
            angle = start_angle - i*angle_increment;
            forward_distance = i==0 ? (width/2 - hole_clearance) - length + strap_width*2  : (width/2 - hole_clearance) * cos(angle);
            translate([(width/2 - hole_clearance - knot_hole_diameter/2) * sin(angle), forward_distance, 0]) {
                rotate([0, 0, -angle/2])
                #finger_hole();
                
            }
        }
    }
    
}

module finger_hole(){
    $fn = 30;
    translate([0, -elastic_hole_diameter/2, -large_distance/2]){
        cylinder(d=elastic_hole_diameter, h=large_distance);
        translate([0, -knot_hole_diameter/2 - elastic_hole_diameter/2 - slot_length , 0]) {
            cylinder(d=knot_hole_diameter, h=large_distance);
        }
        // slot_length = slot_length;
        translate([-gap_width/2,  -elastic_hole_diameter/2 - knot_hole_diameter/2 - slot_length, 0]) {
            cube([gap_width, elastic_hole_diameter/2 + knot_hole_diameter/2 + slot_length, large_distance]);
        }
    }
}
